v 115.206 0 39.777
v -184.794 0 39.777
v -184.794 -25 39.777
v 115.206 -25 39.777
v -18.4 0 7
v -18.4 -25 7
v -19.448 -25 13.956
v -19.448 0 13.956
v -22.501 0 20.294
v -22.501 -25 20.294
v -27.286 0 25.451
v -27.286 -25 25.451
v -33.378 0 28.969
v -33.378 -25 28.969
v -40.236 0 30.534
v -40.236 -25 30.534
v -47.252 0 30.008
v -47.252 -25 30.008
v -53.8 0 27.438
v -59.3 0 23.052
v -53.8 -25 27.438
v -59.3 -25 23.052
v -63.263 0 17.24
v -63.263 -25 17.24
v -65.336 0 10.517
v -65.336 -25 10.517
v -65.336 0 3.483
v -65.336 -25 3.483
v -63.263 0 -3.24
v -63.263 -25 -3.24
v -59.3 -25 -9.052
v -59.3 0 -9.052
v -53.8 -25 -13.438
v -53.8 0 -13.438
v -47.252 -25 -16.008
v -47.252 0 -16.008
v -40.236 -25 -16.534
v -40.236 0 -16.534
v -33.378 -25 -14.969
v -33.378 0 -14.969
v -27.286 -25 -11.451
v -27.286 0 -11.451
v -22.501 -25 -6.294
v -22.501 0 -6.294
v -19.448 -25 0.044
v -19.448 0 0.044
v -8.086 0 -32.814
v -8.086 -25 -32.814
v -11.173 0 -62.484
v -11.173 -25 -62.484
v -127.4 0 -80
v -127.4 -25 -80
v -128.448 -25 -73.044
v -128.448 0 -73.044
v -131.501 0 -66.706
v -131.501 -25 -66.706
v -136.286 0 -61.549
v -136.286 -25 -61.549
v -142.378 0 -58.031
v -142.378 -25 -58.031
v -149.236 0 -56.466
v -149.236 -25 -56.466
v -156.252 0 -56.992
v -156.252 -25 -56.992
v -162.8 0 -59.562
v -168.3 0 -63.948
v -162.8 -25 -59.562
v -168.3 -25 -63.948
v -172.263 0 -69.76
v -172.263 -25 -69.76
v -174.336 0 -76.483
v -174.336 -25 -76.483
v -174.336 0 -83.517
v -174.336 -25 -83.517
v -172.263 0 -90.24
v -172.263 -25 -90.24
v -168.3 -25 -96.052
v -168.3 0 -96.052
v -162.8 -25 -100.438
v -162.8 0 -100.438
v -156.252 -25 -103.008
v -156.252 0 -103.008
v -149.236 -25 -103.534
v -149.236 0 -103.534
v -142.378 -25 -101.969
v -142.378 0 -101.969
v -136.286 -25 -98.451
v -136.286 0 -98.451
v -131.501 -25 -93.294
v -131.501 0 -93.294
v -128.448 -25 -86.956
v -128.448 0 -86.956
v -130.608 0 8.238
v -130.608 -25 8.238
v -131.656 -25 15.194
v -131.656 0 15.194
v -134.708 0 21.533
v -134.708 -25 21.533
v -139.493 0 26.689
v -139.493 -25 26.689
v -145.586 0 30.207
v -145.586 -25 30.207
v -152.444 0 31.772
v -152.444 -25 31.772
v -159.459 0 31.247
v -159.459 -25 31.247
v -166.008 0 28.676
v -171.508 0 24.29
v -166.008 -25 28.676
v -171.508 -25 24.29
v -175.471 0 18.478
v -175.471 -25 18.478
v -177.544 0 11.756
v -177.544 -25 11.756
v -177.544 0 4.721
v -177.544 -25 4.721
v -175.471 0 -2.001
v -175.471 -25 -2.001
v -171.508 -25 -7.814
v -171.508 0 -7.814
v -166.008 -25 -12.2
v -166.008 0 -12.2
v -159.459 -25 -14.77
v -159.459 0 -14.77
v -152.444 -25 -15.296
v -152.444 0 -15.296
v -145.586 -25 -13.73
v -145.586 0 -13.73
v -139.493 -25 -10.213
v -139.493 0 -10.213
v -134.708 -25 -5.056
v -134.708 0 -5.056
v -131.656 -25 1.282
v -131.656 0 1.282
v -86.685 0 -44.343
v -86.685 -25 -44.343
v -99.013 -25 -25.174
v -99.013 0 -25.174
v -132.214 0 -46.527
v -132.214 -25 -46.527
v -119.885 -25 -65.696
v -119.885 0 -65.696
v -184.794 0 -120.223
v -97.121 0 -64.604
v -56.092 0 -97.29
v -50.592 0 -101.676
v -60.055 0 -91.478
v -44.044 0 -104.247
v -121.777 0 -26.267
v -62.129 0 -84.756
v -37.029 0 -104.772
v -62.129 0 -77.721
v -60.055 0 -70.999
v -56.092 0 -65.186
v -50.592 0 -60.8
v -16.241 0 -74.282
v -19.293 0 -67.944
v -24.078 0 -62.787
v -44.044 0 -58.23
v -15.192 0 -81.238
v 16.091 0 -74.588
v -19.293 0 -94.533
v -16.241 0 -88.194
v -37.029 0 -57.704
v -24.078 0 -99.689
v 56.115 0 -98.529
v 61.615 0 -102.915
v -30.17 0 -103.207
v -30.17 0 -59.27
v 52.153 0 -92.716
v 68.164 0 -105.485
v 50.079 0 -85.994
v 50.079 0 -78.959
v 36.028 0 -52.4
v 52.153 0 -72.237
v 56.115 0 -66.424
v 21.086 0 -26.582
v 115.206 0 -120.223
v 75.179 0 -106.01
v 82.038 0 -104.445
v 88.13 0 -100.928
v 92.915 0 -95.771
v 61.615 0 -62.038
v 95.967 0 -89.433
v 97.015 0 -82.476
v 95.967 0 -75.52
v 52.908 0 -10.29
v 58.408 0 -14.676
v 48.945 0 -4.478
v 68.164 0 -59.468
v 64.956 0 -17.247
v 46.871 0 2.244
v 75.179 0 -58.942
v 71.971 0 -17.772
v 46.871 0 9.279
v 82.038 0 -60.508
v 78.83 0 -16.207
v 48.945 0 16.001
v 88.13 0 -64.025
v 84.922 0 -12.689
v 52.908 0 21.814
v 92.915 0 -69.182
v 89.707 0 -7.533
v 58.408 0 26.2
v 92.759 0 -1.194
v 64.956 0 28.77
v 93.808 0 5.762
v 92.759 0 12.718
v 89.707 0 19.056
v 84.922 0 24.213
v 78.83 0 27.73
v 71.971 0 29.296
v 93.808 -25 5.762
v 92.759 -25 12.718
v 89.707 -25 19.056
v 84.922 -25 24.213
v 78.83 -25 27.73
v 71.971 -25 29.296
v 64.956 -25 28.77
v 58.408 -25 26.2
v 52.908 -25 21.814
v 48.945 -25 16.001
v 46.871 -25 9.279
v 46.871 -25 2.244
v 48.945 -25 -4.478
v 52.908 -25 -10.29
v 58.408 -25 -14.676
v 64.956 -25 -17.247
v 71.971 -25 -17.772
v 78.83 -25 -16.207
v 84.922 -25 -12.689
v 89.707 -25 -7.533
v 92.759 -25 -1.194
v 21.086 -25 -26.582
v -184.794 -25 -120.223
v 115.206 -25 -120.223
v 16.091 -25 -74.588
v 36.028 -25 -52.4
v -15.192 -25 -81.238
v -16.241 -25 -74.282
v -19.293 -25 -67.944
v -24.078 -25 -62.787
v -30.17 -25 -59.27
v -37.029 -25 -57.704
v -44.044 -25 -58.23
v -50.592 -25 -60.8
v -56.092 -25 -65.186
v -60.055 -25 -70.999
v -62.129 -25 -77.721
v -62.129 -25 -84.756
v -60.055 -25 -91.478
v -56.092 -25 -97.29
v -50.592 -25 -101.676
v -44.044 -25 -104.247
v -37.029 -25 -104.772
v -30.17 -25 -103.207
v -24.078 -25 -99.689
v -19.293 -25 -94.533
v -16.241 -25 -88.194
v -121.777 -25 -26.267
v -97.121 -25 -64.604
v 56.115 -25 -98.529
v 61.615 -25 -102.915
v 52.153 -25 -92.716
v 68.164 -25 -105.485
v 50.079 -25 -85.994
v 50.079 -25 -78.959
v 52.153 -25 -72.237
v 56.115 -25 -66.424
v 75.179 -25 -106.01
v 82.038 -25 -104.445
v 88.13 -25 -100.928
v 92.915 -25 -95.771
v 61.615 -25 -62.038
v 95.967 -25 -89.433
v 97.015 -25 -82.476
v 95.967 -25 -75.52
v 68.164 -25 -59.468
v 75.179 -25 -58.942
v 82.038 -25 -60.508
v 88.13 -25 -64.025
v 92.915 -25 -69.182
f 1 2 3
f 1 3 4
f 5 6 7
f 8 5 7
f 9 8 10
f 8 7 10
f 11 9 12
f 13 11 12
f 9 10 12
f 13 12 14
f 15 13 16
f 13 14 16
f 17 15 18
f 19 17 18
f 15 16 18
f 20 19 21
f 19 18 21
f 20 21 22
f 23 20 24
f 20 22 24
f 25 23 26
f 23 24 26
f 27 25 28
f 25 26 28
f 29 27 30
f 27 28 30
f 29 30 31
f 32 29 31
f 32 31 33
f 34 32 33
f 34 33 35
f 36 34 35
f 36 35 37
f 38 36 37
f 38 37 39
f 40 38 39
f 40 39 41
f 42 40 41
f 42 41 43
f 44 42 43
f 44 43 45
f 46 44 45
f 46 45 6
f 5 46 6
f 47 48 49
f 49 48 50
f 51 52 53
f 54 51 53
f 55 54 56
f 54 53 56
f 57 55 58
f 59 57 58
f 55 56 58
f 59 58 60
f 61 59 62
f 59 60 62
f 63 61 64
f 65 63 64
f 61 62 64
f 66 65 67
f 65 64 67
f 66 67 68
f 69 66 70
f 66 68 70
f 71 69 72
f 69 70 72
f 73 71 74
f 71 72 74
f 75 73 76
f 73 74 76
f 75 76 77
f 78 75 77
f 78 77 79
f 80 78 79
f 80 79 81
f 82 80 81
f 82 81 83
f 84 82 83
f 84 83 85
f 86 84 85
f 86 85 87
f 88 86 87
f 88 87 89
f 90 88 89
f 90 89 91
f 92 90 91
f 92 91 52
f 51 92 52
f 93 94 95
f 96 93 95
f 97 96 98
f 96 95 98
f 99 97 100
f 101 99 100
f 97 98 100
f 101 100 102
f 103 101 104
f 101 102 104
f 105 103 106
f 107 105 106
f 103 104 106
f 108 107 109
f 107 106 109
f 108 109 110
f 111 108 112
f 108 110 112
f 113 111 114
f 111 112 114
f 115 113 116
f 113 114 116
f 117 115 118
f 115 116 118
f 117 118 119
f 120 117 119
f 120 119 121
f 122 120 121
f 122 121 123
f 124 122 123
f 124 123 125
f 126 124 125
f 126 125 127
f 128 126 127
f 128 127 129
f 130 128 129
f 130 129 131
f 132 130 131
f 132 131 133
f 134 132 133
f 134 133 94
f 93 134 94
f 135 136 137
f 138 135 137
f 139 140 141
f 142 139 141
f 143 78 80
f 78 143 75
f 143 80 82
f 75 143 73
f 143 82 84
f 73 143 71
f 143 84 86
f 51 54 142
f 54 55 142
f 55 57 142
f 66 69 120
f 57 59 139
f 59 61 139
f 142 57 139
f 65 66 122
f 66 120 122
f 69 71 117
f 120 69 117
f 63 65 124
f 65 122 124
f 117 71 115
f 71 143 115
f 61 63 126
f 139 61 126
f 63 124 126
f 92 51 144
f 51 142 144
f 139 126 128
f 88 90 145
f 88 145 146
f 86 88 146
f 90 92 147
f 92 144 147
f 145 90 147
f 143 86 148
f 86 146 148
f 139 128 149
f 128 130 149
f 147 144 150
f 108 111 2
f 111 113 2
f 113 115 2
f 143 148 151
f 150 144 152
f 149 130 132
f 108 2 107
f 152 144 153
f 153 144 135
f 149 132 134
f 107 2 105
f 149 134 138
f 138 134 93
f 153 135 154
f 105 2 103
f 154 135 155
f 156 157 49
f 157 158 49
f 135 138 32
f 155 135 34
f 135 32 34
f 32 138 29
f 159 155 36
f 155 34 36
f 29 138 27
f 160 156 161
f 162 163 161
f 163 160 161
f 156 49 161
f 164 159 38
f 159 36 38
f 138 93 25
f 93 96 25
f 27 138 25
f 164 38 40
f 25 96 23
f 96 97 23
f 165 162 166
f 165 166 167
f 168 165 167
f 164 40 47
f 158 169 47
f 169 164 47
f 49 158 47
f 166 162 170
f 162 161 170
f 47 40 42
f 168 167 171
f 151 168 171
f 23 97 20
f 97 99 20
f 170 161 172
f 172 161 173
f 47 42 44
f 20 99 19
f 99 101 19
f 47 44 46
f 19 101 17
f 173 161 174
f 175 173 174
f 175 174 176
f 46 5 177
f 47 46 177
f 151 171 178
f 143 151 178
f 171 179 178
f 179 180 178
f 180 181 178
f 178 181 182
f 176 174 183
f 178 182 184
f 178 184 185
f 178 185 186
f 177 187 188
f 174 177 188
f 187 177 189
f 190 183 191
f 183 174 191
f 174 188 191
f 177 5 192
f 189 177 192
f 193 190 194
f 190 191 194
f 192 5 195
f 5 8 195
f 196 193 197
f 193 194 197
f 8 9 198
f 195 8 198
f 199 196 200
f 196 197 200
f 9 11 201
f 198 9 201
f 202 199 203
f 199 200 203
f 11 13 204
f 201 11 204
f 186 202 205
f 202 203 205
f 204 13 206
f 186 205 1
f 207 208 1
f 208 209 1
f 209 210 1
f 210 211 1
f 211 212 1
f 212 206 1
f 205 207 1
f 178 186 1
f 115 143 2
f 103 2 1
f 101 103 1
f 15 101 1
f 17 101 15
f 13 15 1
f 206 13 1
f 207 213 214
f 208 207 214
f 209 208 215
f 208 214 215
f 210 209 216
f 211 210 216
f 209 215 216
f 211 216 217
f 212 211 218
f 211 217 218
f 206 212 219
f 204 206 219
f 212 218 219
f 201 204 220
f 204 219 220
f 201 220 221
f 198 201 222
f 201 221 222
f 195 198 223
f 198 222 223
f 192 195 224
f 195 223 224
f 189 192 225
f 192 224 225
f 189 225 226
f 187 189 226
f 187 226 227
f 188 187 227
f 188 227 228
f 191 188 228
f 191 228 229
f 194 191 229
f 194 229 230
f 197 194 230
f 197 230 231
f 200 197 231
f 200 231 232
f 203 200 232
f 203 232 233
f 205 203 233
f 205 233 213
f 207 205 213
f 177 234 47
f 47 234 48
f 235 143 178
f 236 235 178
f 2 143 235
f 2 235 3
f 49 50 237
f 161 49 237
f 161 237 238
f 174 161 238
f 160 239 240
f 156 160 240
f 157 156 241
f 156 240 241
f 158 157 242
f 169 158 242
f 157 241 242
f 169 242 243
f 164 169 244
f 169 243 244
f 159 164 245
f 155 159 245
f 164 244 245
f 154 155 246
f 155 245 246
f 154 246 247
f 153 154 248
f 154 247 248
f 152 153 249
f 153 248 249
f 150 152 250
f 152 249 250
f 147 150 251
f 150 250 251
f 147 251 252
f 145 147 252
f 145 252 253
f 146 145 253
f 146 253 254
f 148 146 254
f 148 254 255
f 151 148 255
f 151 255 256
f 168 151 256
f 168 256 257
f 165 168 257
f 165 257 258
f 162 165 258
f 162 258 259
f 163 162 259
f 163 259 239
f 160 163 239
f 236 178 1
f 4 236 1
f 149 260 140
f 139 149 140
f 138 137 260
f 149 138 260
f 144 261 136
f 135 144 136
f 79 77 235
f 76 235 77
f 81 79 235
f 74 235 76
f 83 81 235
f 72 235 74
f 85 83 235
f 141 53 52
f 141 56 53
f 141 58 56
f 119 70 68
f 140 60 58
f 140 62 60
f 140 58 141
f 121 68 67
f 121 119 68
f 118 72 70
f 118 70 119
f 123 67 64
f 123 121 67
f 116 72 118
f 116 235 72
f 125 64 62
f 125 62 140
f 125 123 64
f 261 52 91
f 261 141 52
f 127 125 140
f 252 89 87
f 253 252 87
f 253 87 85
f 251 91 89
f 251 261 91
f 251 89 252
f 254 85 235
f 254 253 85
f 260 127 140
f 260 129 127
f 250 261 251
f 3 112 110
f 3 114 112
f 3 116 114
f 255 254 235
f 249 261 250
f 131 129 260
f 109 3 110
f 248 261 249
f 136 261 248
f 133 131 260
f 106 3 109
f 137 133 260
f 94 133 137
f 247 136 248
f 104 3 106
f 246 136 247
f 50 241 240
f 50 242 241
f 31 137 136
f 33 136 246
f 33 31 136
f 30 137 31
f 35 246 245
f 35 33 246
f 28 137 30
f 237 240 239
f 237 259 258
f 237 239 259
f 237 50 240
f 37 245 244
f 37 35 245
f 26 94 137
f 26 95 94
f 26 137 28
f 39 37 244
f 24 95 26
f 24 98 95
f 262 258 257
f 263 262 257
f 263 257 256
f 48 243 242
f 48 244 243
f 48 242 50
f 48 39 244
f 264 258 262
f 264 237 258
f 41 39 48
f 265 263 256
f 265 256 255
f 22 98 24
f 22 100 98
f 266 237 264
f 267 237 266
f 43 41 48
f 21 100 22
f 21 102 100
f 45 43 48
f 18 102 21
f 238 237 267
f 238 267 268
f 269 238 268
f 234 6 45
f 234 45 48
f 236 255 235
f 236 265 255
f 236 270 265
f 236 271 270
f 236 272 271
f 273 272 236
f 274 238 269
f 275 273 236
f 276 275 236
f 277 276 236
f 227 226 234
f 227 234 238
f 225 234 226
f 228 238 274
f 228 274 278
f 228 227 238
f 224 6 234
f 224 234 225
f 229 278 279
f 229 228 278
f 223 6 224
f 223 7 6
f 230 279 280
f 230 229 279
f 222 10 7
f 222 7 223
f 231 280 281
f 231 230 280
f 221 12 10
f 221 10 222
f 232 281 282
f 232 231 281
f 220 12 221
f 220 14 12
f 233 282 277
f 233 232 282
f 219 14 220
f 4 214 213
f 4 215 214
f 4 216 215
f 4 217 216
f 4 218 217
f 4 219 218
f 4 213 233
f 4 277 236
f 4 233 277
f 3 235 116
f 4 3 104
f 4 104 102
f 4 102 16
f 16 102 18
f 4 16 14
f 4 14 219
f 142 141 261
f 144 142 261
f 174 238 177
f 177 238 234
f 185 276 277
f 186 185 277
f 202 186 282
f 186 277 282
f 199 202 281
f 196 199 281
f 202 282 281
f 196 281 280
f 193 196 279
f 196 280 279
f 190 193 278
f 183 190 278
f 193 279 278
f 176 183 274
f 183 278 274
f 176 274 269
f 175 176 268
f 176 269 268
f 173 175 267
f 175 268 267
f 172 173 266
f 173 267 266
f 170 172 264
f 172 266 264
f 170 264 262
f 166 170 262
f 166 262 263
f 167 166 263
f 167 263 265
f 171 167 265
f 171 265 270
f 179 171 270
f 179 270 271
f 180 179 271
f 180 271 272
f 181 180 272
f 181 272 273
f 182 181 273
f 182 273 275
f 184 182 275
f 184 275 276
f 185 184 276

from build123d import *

# Parameters (mm, degrees)
F0_W     = 300
F0_H     = 160
F1_DEPTH = 25
F2_R     = 23.600051
F3_DEPTH = 25.001
F5_DEPTH = 25.001
F7_DEPTH = 25.001


with BuildPart() as f1:
    # F0 (on Front) → F1 (new body)
    with BuildSketch(Plane.XZ):
        with Locations((-34.793959, -40.223419)):
            Rectangle(F0_W, F0_H)
    extrude(amount=F1_DEPTH)

    # F2 (on face) → F3 (cut, through all)
    with BuildSketch(Plane.XZ.offset(25)):
        with Locations((-154.207721, 8.238197)):
            Circle(F2_R)
        with Locations((-42, 7)):
            Circle(F2_R)
        with Locations((70.207721, 5.761803)):
            Circle(F2_R)
        with Locations((73.415443, -82.476395)):
            Circle(F2_R)
        with Locations((-38.792279, -81.238197)):
            Circle(F2_R)
        with Locations((-151, -80)):
            Circle(F2_R)
    extrude(amount=-F3_DEPTH, mode=Mode.SUBTRACT)

    # F4 (on face) → F5 (cut, through all)
    with BuildSketch(Plane.XZ.offset(25)):
        Polygon((-86.684604, -44.342975), (-99.012743, -25.174466), (-121.777227, -26.266693), (-132.213573, -46.527428), (-119.885435, -65.695936), (-97.12095, -64.60371), align=None)
    extrude(amount=-F5_DEPTH, mode=Mode.SUBTRACT)

    # F6 (on face) → F7 (cut, through all)
    with BuildSketch(Plane.XZ.offset(25)):
        Polygon((36.027657, -52.399745), (21.085804, -26.581729), (-8.085875, -32.814069), (-11.173111, -62.483884), (16.090551, -74.588498), align=None)
    extrude(amount=-F7_DEPTH, mode=Mode.SUBTRACT)


solid = f1.part
